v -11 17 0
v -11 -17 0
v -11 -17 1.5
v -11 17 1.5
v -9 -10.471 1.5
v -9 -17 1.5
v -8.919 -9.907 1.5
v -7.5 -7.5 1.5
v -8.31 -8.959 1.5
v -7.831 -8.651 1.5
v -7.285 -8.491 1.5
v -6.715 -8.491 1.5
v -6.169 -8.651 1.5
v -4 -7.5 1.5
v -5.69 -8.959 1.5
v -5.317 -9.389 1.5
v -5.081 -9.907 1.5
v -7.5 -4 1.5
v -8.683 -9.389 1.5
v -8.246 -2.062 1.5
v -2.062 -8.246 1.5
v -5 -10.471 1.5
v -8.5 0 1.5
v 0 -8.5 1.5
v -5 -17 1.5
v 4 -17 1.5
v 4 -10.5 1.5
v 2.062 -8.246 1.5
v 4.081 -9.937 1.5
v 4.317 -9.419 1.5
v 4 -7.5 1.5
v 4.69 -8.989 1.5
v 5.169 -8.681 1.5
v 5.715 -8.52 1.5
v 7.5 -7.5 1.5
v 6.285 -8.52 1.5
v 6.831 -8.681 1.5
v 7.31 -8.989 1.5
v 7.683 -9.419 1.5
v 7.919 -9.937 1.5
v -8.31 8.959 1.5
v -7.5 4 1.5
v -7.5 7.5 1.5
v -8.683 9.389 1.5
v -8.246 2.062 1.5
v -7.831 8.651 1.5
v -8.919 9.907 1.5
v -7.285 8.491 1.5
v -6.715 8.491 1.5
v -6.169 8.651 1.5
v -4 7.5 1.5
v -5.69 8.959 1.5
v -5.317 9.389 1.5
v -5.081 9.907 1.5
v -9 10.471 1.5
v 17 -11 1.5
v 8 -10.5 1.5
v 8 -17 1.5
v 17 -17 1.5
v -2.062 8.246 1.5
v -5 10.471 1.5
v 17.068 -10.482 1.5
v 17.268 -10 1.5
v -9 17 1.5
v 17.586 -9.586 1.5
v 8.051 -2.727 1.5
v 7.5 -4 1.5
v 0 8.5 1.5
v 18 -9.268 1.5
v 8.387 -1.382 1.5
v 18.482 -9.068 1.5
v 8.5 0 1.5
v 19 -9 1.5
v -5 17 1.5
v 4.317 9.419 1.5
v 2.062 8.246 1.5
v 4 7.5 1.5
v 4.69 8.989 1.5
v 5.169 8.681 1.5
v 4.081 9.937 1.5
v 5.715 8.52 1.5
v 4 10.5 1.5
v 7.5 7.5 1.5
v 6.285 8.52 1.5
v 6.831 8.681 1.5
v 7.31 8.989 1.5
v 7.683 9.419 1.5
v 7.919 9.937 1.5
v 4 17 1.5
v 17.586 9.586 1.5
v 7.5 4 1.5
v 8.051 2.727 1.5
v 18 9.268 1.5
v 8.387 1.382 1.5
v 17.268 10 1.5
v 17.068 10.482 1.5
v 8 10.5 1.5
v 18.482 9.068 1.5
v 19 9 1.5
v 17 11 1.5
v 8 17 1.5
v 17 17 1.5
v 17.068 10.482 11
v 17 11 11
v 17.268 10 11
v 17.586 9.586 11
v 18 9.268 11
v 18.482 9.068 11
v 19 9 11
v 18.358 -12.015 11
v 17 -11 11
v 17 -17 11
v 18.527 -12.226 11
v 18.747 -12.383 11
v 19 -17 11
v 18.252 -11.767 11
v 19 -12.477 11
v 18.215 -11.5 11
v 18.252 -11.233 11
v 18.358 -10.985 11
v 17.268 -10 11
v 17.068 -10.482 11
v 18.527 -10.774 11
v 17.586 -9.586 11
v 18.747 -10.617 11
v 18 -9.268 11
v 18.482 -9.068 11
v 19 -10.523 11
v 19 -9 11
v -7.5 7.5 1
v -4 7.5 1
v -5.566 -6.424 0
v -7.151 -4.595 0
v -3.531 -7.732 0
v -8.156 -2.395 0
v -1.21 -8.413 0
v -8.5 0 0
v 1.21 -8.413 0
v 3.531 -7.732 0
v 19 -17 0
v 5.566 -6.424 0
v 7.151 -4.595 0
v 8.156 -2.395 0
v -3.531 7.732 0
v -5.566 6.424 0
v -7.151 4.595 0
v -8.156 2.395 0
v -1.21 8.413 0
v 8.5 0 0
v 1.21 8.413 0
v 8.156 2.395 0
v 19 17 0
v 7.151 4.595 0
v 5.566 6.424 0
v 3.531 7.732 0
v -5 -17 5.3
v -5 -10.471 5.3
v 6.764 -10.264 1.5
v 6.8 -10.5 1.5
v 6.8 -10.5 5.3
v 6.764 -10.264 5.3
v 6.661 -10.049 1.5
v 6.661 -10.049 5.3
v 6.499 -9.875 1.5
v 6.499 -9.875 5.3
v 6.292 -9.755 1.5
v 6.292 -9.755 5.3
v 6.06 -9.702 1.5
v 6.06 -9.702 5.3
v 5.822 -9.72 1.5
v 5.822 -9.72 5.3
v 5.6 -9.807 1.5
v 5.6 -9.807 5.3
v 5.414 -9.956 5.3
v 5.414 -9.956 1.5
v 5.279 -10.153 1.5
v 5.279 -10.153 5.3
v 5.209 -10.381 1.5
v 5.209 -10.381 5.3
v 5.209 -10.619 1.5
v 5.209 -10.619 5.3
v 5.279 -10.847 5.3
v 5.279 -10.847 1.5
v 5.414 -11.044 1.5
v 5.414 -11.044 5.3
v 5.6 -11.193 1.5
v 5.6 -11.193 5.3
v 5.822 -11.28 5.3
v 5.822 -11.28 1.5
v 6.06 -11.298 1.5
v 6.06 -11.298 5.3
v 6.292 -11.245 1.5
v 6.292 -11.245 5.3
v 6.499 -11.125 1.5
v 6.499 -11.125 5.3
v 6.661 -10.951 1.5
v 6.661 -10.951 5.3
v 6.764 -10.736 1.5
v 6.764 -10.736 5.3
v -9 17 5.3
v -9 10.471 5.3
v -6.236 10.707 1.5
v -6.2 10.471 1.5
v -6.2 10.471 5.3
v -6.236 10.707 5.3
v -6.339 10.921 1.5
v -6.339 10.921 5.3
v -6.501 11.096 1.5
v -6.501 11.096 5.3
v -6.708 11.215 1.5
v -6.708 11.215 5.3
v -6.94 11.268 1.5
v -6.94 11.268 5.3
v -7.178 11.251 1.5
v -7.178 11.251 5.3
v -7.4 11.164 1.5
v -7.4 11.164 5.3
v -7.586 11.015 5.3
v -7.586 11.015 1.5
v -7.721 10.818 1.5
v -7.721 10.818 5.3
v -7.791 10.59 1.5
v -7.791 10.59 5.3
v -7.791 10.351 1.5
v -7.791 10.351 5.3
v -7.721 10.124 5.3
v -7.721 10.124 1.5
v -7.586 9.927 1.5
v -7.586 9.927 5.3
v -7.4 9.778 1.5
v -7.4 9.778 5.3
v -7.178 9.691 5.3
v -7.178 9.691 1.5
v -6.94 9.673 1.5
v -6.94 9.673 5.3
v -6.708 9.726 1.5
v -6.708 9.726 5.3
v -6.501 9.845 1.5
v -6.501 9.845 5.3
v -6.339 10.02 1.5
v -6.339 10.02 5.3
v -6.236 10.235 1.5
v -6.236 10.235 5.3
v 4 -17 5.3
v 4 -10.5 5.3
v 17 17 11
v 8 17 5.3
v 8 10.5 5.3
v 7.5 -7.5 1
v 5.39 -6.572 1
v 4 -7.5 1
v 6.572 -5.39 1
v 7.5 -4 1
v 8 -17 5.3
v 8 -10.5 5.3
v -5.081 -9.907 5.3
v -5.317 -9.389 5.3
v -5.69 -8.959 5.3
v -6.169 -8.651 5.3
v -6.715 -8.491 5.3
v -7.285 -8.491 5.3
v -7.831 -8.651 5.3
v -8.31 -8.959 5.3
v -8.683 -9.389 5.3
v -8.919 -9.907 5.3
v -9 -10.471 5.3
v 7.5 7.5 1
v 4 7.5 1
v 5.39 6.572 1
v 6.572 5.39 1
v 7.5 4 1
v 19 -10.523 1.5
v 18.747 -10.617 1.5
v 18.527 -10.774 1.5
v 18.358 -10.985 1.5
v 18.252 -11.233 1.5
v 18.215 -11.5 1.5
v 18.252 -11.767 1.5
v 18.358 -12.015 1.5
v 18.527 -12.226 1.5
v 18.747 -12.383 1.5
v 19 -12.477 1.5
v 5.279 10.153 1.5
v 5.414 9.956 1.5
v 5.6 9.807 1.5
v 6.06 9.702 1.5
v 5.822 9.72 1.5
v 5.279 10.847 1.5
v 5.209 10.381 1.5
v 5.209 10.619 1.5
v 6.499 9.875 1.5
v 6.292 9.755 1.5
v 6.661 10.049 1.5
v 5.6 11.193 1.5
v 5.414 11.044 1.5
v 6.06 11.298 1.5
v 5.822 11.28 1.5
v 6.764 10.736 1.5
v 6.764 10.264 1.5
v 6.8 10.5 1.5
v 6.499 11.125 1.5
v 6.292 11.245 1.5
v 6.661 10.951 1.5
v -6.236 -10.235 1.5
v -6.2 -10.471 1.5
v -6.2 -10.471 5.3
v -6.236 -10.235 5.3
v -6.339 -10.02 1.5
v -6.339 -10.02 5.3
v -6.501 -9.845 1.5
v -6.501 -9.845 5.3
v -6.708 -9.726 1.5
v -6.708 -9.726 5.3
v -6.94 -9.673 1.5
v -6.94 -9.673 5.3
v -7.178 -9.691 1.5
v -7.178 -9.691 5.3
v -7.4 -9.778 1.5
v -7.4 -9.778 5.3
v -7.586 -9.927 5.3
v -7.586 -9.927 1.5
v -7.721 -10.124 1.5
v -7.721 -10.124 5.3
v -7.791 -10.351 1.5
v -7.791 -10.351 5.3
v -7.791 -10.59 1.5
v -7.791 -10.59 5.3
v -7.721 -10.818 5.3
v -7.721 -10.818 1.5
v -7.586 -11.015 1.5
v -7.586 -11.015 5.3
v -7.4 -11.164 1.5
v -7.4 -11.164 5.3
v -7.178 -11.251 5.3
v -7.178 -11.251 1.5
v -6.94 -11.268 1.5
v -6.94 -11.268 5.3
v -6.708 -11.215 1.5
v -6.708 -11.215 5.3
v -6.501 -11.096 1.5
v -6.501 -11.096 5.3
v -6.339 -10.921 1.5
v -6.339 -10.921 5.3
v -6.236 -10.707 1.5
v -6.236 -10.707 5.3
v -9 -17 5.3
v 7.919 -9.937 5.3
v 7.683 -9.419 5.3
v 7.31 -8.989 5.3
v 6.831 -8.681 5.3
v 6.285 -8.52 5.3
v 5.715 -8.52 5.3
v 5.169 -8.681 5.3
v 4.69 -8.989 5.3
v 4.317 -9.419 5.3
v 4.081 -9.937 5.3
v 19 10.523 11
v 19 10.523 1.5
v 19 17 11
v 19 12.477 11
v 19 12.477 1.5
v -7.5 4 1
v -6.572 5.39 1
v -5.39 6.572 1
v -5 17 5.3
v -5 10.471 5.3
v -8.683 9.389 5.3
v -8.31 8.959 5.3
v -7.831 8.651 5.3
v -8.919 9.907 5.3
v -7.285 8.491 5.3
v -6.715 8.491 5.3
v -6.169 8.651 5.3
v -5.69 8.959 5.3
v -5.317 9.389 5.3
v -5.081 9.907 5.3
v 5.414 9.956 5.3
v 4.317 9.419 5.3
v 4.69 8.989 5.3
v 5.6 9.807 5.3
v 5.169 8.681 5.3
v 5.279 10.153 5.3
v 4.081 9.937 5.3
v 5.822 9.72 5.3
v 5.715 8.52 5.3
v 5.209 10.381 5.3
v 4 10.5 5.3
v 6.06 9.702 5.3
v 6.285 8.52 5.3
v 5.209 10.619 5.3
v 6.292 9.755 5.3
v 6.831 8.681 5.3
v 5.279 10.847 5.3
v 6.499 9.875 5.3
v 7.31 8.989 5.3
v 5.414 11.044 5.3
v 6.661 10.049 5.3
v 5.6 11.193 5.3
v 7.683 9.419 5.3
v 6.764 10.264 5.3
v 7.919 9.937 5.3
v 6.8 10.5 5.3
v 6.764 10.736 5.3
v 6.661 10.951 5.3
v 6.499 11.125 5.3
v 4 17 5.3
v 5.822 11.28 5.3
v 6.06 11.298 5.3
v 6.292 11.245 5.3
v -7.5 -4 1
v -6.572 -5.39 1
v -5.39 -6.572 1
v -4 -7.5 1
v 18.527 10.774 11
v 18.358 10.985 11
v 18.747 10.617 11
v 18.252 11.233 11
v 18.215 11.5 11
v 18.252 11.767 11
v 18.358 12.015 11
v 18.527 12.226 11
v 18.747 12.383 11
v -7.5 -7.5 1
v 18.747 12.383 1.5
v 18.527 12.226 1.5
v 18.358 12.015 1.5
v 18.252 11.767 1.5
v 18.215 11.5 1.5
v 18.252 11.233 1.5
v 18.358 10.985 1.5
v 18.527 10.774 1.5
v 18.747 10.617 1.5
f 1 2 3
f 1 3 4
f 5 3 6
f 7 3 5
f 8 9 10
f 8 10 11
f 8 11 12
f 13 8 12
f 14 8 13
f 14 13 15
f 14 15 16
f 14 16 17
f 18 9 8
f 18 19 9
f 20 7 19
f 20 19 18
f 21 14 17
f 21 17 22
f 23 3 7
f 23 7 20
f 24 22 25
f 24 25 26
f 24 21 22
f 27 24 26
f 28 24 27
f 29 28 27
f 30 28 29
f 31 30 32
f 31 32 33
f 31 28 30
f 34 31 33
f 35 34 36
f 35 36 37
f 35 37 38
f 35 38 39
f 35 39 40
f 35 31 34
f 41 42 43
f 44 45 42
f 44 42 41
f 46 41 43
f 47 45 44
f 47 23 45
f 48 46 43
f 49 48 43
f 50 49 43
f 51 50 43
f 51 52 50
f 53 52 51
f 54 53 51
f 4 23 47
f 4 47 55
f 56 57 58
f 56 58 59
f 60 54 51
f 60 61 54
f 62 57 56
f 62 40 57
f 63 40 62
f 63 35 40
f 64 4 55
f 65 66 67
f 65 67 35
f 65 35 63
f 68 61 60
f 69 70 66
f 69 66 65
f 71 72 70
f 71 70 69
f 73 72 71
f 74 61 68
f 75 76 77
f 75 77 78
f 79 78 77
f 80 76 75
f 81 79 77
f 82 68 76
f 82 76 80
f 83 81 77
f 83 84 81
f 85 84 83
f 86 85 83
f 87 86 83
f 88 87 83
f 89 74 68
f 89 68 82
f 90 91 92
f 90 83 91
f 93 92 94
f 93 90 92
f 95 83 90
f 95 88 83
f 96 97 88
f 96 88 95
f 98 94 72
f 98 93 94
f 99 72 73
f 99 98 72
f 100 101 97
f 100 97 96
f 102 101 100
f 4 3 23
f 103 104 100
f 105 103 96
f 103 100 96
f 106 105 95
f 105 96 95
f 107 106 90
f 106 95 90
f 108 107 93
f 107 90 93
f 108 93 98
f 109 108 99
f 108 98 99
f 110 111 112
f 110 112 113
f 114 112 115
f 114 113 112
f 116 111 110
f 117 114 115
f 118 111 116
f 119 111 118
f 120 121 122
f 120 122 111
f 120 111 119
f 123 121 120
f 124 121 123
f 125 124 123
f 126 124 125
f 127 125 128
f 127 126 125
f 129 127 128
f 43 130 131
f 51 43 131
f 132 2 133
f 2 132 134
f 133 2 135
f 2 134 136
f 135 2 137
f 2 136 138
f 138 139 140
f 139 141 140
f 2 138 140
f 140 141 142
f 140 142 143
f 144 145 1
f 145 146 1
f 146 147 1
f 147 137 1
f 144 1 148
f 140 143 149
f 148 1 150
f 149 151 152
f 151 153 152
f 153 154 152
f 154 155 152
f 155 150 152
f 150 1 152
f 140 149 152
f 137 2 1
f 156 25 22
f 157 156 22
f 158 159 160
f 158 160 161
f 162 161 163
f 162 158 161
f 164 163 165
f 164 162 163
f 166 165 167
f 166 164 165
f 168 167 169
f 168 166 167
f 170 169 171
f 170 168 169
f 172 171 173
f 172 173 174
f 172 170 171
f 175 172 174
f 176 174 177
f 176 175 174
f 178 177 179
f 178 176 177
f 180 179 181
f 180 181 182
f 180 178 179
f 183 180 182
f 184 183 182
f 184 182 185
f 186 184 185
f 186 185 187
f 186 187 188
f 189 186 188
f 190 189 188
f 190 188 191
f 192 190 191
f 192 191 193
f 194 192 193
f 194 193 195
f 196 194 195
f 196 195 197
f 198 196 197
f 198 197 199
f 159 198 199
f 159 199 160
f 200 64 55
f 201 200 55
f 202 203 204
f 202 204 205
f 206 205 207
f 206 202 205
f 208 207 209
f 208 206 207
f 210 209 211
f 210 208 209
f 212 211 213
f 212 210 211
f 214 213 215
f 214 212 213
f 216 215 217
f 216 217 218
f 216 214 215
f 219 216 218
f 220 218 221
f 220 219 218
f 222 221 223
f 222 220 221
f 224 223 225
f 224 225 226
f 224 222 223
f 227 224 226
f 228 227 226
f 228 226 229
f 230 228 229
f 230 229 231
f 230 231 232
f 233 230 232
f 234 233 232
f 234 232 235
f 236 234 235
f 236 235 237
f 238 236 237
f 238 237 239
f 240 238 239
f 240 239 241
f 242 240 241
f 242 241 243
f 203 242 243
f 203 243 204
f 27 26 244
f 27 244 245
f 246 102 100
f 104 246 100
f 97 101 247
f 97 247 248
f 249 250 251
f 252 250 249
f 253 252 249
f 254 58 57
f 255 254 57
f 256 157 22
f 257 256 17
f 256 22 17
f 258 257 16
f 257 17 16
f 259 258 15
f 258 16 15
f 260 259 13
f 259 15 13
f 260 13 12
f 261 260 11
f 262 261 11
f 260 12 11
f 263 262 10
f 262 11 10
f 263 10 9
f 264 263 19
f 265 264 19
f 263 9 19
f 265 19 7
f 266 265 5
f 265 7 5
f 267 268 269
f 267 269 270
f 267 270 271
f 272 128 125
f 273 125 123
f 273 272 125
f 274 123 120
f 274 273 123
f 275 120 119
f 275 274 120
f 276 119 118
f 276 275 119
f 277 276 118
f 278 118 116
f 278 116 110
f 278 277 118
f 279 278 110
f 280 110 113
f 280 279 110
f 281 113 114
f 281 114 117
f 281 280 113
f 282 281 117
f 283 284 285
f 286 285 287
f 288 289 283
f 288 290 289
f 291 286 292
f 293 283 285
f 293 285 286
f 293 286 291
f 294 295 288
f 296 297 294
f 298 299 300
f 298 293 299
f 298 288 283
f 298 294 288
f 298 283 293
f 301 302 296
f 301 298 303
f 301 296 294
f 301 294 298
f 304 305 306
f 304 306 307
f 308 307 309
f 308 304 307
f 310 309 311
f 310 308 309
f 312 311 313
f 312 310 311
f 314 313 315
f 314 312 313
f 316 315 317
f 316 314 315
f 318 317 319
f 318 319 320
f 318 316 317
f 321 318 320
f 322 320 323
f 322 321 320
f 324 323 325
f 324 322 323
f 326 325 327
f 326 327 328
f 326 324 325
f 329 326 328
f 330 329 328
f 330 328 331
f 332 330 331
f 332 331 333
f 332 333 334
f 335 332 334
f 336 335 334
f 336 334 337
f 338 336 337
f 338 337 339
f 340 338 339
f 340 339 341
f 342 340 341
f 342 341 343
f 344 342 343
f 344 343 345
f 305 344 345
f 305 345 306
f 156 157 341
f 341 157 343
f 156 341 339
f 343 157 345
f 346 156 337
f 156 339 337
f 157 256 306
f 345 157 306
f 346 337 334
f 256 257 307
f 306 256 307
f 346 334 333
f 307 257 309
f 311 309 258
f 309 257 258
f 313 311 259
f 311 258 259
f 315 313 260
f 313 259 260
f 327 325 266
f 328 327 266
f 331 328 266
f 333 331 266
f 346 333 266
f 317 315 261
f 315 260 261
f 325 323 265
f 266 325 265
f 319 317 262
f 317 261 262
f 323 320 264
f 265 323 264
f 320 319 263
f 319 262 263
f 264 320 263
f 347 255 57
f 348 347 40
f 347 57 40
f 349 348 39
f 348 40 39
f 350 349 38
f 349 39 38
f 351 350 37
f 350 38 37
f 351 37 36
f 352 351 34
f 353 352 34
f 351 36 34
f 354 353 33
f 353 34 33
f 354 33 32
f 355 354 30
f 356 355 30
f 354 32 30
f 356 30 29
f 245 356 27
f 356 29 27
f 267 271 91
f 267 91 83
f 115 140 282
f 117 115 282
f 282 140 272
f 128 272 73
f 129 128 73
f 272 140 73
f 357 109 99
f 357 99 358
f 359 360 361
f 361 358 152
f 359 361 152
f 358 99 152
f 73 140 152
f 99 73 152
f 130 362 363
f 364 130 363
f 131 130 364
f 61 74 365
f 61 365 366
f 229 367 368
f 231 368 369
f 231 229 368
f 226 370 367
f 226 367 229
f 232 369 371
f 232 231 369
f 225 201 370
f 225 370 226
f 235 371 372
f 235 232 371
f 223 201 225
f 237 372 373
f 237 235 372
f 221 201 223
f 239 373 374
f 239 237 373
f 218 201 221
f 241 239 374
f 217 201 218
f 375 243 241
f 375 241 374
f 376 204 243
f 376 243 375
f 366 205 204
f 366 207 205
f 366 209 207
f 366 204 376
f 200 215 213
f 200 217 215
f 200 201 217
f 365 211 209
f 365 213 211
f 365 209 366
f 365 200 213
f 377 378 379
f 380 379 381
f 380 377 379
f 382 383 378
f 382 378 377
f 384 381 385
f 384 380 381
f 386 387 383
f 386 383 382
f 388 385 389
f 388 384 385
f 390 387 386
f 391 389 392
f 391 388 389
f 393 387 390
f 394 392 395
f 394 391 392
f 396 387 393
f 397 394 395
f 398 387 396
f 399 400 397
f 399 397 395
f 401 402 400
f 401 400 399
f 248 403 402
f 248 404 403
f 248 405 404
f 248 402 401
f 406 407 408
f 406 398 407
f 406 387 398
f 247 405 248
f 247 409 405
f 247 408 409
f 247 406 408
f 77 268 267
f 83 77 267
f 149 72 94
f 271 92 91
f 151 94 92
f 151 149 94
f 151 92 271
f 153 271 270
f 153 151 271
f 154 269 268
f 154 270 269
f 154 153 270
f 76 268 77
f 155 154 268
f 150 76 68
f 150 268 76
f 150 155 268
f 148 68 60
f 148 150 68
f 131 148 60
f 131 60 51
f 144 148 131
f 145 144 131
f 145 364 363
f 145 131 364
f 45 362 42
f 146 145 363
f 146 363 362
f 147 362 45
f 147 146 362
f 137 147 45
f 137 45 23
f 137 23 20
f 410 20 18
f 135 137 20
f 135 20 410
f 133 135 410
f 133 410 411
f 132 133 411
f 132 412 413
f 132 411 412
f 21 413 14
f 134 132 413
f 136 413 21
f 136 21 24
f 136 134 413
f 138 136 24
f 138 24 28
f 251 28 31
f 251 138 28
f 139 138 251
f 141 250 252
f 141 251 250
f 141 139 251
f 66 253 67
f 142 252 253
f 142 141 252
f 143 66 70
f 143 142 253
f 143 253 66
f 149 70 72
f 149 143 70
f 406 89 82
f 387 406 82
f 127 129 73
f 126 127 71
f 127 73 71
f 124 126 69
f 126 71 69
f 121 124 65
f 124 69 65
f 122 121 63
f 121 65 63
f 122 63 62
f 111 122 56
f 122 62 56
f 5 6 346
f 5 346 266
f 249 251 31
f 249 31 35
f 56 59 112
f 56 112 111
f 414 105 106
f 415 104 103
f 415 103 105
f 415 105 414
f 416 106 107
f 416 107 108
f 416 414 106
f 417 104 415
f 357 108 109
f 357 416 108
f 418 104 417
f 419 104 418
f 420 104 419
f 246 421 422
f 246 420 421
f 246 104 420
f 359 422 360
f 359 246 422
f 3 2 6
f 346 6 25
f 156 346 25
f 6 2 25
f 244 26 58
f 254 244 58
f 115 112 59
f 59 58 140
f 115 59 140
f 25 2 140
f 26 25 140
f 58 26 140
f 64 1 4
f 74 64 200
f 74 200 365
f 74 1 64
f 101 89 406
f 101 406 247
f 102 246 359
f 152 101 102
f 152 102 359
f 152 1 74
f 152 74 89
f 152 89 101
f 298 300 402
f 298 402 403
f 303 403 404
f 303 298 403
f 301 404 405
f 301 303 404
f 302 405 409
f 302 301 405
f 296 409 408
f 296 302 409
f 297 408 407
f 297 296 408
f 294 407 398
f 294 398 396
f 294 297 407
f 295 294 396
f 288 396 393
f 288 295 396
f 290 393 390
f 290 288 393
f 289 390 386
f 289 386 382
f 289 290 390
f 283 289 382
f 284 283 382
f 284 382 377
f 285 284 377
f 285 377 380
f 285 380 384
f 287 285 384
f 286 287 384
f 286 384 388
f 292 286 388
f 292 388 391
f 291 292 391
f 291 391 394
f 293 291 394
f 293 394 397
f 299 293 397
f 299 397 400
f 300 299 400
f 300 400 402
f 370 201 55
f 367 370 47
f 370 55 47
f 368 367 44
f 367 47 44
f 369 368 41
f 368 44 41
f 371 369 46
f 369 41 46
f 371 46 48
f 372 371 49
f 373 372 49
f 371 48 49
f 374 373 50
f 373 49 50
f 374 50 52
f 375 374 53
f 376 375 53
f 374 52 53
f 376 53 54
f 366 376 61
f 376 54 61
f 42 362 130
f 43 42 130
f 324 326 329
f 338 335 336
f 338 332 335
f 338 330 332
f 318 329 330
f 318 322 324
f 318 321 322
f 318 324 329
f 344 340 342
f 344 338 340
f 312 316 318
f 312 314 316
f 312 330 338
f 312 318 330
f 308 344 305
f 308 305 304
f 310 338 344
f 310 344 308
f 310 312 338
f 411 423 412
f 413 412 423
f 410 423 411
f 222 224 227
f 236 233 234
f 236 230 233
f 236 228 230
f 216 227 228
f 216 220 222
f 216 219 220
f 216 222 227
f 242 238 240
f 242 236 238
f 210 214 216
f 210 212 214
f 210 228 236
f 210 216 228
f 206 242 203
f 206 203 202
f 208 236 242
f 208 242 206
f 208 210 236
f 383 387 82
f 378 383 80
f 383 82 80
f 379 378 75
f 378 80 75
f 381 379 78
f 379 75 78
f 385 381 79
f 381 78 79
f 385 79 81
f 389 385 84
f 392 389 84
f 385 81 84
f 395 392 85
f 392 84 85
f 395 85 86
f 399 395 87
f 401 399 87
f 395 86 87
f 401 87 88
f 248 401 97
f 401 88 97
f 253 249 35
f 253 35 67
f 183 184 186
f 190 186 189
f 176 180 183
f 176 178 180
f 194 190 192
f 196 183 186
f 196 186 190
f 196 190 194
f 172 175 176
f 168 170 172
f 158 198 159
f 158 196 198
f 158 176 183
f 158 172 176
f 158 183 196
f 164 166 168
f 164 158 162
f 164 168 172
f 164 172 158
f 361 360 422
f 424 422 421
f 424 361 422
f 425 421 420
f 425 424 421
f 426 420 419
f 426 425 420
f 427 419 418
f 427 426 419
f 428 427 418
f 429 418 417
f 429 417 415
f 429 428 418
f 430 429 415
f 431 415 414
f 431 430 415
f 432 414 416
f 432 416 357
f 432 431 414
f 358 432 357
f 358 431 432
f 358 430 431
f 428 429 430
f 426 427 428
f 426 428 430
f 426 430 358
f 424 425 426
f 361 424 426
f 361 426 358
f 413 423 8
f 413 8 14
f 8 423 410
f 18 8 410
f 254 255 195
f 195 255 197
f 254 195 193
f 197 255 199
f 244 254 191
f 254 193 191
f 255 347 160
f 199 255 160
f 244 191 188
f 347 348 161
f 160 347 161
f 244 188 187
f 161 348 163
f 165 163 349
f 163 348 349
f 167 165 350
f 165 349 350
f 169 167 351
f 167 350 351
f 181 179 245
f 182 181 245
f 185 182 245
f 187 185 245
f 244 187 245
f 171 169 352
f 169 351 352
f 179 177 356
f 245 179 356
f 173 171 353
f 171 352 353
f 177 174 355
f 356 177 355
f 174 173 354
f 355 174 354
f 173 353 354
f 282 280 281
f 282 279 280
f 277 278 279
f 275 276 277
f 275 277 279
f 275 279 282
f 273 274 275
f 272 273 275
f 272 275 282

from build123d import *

# Parameters (mm, degrees)
SKETCH023_W      = 12
SKETCH023_H      = 4.8
PAD011_DEPTH     = 30
SKETCH026_W      = 8.3
SKETCH026_H      = 4.2
PAD014_DEPTH     = 30
BOX014_W         = 15
BOX014_H         = 15
BOX014_DEPTH     = 10
SKETCH025_W      = 8.2
SKETCH025_H      = 4.2
PAD013_DEPTH     = 30
SKETCH020_R      = 1
PAD007_DEPTH     = 20
SKETCH021_R      = 1
PAD008_DEPTH     = 11
SKETCH022_R      = 0.8
PAD009_DEPTH     = 5.3
MIRROREDSKETCH_R = 0.8
PAD010_DEPTH     = 5.3
PAD018_DEPTH     = 3
ARRAY007_X_COUNT = 2
ARRAY007_X_PITCH = 70
SKETCH_R         = 8.5
PAD_DEPTH        = 1.5
BOX013_W         = 30
BOX013_H         = 34
BOX013_DEPTH     = 21


with BuildPart() as body006:
    # Sketch023 → Pad011 (new body)
    with BuildSketch(Plane.XZ):
        with Locations((-29.8, 14.9)):
            Rectangle(SKETCH023_W, SKETCH023_H)
    extrude(amount=PAD011_DEPTH)


with BuildPart() as body:
    # Sketch026 → Pad014 (new body)
    with BuildSketch(Plane.XZ):
        with Locations((11.75, 14.6)):
            Rectangle(SKETCH026_W, SKETCH026_H)
    extrude(amount=PAD014_DEPTH)


with BuildPart() as camera_hole_extract_cube:
    # Box014 → Box014 (new body)
    with BuildSketch(Plane(origin=(-7.5, -7.5, 1), x_dir=(1, 0, 0), z_dir=(0, 0, 1))):
        with Locations((7.5, 7.5)):
            Rectangle(BOX014_W, BOX014_H)
    extrude(amount=BOX014_DEPTH)


with BuildPart() as extract_fusion002:
    # Sketch025 → Pad013 (new body)
    with BuildSketch(Plane.XZ):
        with Locations((-0.9, 14.6)):
            Rectangle(SKETCH025_W, SKETCH025_H)
    extrude(amount=PAD013_DEPTH)

    # Fusion010: union Body006, Body, camera hole extract cube
    add(body006.part)
    add(body.part)
    add(camera_hole_extract_cube.part)


with BuildPart() as level3_body:
    # Sketch020 → Pad007 (new body)
    with BuildSketch(Plane.XY):
        with BuildLine():
            Line((-56, 13), (-56, 9))
            Line((-56, 9), (-47.5, 9))
            Line((-47.5, 9), (-47.5, 17))
            Line((-47.5, 17), (26, 17))
            ThreePointArc((29, 14), (28.12132, 16.12132), (26, 17))
            Line((29, 8.86), (29, 14))
            ThreePointArc((29, 8.86), (29.146447, 8.506447), (29.5, 8.36))
            Line((29.5, 8.36), (31.5, 8.36))
            ThreePointArc((33, 6.86), (32.56066, 7.92066), (31.5, 8.36))
            Line((33, -6.86), (33, 6.86))
            ThreePointArc((31.5, -8.36), (32.56066, -7.92066), (33, -6.86))
            Line((29.5, -8.36), (31.5, -8.36))
            ThreePointArc((29.5, -8.36), (29.146447, -8.506447), (29, -8.86))
            Line((29, -8.86), (29, -14))
            ThreePointArc((26, -17), (28.12132, -16.12132), (29, -14))
            Line((-47.5, -17), (26, -17))
            Line((-47.5, -9), (-47.5, -17))
            Line((-56, -9), (-47.5, -9))
            Line((-56, -9), (-56, -13))
            ThreePointArc((-56, -13), (-54.535534, -16.535534), (-51, -18))
            Line((31, -18), (-51, -18))
            ThreePointArc((31, -18), (38.238337, 0), (31, 18))
            Line((-51, 18), (31, 18))
            ThreePointArc((-51, 18), (-54.535534, 16.535534), (-56, 13))
        make_face()
        with Locations((-52, -14.3)):
            Circle(SKETCH020_R, mode=Mode.SUBTRACT)
        with Locations((31.5, 11.4)):
            Circle(SKETCH020_R, mode=Mode.SUBTRACT)
        with Locations((31.5, -11.4)):
            Circle(SKETCH020_R, mode=Mode.SUBTRACT)
        with Locations((-52, 14.3)):
            Circle(SKETCH020_R, mode=Mode.SUBTRACT)
    extrude(amount=PAD007_DEPTH)


with BuildPart() as level2_body:
    # Sketch021 → Pad008 (new body)
    with BuildSketch(Plane.XY):
        with BuildLine():
            Line((-56, 13), (-56, 9))
            Line((-56, 9), (-36.211556, 9))
            ThreePointArc((-36.211556, 9), (-35.354856, 9.354856), (-35, 10.211556))
            Line((-35, 10.211556), (-35, 17))
            Line((-35, 17), (17, 17))
            Line((17, 17), (17, 11))
            ThreePointArc((17, 11), (17.585786, 9.585786), (19, 9))
            Line((19, 9), (31.5, 9))
            ThreePointArc((33, 7.5), (32.56066, 8.56066), (31.5, 9))
            Line((33, -7.5), (33, 7.5))
            ThreePointArc((31.5, -9), (32.56066, -8.56066), (33, -7.5))
            Line((19, -9), (31.5, -9))
            ThreePointArc((19, -9), (17.585786, -9.585786), (17, -11))
            Line((17, -17), (17, -11))
            Line((-35, -17), (17, -17))
            Line((-35, -10.211556), (-35, -17))
            ThreePointArc((-35, -10.211556), (-35.354856, -9.354856), (-36.211556, -9))
            Line((-56, -9), (-36.211556, -9))
            Line((-56, -9), (-56, -13))
            ThreePointArc((-56, -13), (-54.535534, -16.535534), (-51, -18))
            Line((31, -18), (-51, -18))
            ThreePointArc((31, -18), (38.238337, 0), (31, 18))
            Line((-51, 18), (31, 18))
            ThreePointArc((-51, 18), (-54.535534, 16.535534), (-56, 13))
        make_face()
        with Locations((-39.037737, 11.5)):
            Circle(SKETCH021_R, mode=Mode.SUBTRACT)
        with Locations((-39.037737, -11.5)):
            Circle(SKETCH021_R, mode=Mode.SUBTRACT)
        with Locations((19.215181, 11.5)):
            Circle(SKETCH021_R, mode=Mode.SUBTRACT)
        with Locations((19.215181, -11.5)):
            Circle(SKETCH021_R, mode=Mode.SUBTRACT)
    extrude(amount=PAD008_DEPTH)


with BuildPart() as level_1_body:
    # Sketch022 → Pad009 (new body)
    with BuildSketch(Plane.XY):
        with BuildLine():
            Line((-9, 18), (-9, 10.470701))
            ThreePointArc((-9, 10.470701), (-7, 8.470701), (-5, 10.470701))
            Line((-5, 17), (-5, 10.470701))
            Line((-5, 17), (4, 17))
            Line((4, 17), (4, 10.5))
            ThreePointArc((4, 10.5), (6, 8.5), (8, 10.5))
            Line((8, 18), (8, 10.5))
            Line((8, 18), (-9, 18))
        make_face()
        with Locations((-7, 10.470701)):
            Circle(SKETCH022_R, mode=Mode.SUBTRACT)
        with Locations((6, 10.5)):
            Circle(SKETCH022_R, mode=Mode.SUBTRACT)
    extrude(amount=PAD009_DEPTH)


with BuildPart() as level_1_mirror:
    # MirroredSketch → Pad010 (new body)
    with BuildSketch(Plane.XY):
        with BuildLine():
            Line((-9, -18), (-9, -10.470701))
            ThreePointArc((-5, -10.470701), (-7, -8.470701), (-9, -10.470701))
            Line((-5, -17), (-5, -10.470701))
            Line((-5, -17), (4, -17))
            Line((4, -17), (4, -10.5))
            ThreePointArc((8, -10.5), (6, -8.5), (4, -10.5))
            Line((8, -18), (8, -10.5))
            Line((8, -18), (-9, -18))
        make_face()
        with Locations((-7, -10.470701)):
            Circle(MIRROREDSKETCH_R, mode=Mode.SUBTRACT)
        with Locations((6, -10.5)):
            Circle(MIRROREDSKETCH_R, mode=Mode.SUBTRACT)
    extrude(amount=PAD010_DEPTH)


with BuildPart() as attach_body:
    # Sketch030 → Pad018 (new body)
    with BuildSketch(Plane.XY):
        with BuildLine():
            Line((-49.771311, 17), (-49.771311, 32))
            ThreePointArc((-39.771311, 32), (-44.771311, 37), (-49.771311, 32))
            Line((-39.771311, 17), (-39.771311, 32))
            Line((-49.771311, 17), (-39.771311, 17))
        make_face()
        with BuildLine():
            Line((-46.571311, 32), (-46.571311, 22))
            ThreePointArc((-46.571311, 22), (-44.771311, 20.2), (-42.971311, 22))
            Line((-42.971311, 32), (-42.971311, 22))
            ThreePointArc((-42.971311, 32), (-44.771311, 33.8), (-46.571311, 32))
        make_face(mode=Mode.SUBTRACT)
    extrude(amount=PAD018_DEPTH)


with BuildPart() as attachment_array:
    # Part__Mirroring001: instance of attach body
    add(attach_body.part.mirror(Plane(origin=(0, 0, 0), x_dir=(1, 0, 0), z_dir=(0, 1, 0))))

    # Fusion012: union attach body
    add(attach_body.part)

    # Array007 X: attachment array ×2


with BuildPart() as attachment_array_1:
    add(attachment_array.part)
    with Locations(*[(i * ARRAY007_X_PITCH, 0, 0) for i in range(1, ARRAY007_X_COUNT)]):
        add(attachment_array.part)


with BuildPart() as fisheye_body_cut:
    # Sketch → Pad (new body)
    with BuildSketch(Plane.XY):
        with BuildLine():
            Line((-56, 13), (-56, -13))
            ThreePointArc((-56, -13), (-54.535534, -16.535534), (-51, -18))
            Line((31, -18), (-51, -18))
            ThreePointArc((31, -18), (38.238337, 0), (31, 18))
            Line((-51, 18), (31, 18))
            ThreePointArc((-51, 18), (-54.535534, 16.535534), (-56, 13))
        make_face()
        Circle(SKETCH_R, mode=Mode.SUBTRACT)
    extrude(amount=PAD_DEPTH)

    # Fusion009: union level3 body, level2 body, level 1 body, level 1 mirror, attachment array
    add(level3_body.part)
    add(level2_body.part)
    add(level_1_body.part)
    add(level_1_mirror.part)
    add(attachment_array_1.part)

    # Cut002005: cut extract fusion002
    add(extract_fusion002.part, mode=Mode.SUBTRACT)


with BuildPart() as common:
    # Box013 → Box013 (new body)
    with BuildSketch(Plane(origin=(-11, -17, 0), x_dir=(1, 0, 0), z_dir=(0, 0, 1))):
        with Locations((15, 17)):
            Rectangle(BOX013_W, BOX013_H)
    extrude(amount=BOX013_DEPTH)

    # Common: intersect fisheye body cut
    add(fisheye_body_cut.part, mode=Mode.INTERSECT)


solid = common.part
